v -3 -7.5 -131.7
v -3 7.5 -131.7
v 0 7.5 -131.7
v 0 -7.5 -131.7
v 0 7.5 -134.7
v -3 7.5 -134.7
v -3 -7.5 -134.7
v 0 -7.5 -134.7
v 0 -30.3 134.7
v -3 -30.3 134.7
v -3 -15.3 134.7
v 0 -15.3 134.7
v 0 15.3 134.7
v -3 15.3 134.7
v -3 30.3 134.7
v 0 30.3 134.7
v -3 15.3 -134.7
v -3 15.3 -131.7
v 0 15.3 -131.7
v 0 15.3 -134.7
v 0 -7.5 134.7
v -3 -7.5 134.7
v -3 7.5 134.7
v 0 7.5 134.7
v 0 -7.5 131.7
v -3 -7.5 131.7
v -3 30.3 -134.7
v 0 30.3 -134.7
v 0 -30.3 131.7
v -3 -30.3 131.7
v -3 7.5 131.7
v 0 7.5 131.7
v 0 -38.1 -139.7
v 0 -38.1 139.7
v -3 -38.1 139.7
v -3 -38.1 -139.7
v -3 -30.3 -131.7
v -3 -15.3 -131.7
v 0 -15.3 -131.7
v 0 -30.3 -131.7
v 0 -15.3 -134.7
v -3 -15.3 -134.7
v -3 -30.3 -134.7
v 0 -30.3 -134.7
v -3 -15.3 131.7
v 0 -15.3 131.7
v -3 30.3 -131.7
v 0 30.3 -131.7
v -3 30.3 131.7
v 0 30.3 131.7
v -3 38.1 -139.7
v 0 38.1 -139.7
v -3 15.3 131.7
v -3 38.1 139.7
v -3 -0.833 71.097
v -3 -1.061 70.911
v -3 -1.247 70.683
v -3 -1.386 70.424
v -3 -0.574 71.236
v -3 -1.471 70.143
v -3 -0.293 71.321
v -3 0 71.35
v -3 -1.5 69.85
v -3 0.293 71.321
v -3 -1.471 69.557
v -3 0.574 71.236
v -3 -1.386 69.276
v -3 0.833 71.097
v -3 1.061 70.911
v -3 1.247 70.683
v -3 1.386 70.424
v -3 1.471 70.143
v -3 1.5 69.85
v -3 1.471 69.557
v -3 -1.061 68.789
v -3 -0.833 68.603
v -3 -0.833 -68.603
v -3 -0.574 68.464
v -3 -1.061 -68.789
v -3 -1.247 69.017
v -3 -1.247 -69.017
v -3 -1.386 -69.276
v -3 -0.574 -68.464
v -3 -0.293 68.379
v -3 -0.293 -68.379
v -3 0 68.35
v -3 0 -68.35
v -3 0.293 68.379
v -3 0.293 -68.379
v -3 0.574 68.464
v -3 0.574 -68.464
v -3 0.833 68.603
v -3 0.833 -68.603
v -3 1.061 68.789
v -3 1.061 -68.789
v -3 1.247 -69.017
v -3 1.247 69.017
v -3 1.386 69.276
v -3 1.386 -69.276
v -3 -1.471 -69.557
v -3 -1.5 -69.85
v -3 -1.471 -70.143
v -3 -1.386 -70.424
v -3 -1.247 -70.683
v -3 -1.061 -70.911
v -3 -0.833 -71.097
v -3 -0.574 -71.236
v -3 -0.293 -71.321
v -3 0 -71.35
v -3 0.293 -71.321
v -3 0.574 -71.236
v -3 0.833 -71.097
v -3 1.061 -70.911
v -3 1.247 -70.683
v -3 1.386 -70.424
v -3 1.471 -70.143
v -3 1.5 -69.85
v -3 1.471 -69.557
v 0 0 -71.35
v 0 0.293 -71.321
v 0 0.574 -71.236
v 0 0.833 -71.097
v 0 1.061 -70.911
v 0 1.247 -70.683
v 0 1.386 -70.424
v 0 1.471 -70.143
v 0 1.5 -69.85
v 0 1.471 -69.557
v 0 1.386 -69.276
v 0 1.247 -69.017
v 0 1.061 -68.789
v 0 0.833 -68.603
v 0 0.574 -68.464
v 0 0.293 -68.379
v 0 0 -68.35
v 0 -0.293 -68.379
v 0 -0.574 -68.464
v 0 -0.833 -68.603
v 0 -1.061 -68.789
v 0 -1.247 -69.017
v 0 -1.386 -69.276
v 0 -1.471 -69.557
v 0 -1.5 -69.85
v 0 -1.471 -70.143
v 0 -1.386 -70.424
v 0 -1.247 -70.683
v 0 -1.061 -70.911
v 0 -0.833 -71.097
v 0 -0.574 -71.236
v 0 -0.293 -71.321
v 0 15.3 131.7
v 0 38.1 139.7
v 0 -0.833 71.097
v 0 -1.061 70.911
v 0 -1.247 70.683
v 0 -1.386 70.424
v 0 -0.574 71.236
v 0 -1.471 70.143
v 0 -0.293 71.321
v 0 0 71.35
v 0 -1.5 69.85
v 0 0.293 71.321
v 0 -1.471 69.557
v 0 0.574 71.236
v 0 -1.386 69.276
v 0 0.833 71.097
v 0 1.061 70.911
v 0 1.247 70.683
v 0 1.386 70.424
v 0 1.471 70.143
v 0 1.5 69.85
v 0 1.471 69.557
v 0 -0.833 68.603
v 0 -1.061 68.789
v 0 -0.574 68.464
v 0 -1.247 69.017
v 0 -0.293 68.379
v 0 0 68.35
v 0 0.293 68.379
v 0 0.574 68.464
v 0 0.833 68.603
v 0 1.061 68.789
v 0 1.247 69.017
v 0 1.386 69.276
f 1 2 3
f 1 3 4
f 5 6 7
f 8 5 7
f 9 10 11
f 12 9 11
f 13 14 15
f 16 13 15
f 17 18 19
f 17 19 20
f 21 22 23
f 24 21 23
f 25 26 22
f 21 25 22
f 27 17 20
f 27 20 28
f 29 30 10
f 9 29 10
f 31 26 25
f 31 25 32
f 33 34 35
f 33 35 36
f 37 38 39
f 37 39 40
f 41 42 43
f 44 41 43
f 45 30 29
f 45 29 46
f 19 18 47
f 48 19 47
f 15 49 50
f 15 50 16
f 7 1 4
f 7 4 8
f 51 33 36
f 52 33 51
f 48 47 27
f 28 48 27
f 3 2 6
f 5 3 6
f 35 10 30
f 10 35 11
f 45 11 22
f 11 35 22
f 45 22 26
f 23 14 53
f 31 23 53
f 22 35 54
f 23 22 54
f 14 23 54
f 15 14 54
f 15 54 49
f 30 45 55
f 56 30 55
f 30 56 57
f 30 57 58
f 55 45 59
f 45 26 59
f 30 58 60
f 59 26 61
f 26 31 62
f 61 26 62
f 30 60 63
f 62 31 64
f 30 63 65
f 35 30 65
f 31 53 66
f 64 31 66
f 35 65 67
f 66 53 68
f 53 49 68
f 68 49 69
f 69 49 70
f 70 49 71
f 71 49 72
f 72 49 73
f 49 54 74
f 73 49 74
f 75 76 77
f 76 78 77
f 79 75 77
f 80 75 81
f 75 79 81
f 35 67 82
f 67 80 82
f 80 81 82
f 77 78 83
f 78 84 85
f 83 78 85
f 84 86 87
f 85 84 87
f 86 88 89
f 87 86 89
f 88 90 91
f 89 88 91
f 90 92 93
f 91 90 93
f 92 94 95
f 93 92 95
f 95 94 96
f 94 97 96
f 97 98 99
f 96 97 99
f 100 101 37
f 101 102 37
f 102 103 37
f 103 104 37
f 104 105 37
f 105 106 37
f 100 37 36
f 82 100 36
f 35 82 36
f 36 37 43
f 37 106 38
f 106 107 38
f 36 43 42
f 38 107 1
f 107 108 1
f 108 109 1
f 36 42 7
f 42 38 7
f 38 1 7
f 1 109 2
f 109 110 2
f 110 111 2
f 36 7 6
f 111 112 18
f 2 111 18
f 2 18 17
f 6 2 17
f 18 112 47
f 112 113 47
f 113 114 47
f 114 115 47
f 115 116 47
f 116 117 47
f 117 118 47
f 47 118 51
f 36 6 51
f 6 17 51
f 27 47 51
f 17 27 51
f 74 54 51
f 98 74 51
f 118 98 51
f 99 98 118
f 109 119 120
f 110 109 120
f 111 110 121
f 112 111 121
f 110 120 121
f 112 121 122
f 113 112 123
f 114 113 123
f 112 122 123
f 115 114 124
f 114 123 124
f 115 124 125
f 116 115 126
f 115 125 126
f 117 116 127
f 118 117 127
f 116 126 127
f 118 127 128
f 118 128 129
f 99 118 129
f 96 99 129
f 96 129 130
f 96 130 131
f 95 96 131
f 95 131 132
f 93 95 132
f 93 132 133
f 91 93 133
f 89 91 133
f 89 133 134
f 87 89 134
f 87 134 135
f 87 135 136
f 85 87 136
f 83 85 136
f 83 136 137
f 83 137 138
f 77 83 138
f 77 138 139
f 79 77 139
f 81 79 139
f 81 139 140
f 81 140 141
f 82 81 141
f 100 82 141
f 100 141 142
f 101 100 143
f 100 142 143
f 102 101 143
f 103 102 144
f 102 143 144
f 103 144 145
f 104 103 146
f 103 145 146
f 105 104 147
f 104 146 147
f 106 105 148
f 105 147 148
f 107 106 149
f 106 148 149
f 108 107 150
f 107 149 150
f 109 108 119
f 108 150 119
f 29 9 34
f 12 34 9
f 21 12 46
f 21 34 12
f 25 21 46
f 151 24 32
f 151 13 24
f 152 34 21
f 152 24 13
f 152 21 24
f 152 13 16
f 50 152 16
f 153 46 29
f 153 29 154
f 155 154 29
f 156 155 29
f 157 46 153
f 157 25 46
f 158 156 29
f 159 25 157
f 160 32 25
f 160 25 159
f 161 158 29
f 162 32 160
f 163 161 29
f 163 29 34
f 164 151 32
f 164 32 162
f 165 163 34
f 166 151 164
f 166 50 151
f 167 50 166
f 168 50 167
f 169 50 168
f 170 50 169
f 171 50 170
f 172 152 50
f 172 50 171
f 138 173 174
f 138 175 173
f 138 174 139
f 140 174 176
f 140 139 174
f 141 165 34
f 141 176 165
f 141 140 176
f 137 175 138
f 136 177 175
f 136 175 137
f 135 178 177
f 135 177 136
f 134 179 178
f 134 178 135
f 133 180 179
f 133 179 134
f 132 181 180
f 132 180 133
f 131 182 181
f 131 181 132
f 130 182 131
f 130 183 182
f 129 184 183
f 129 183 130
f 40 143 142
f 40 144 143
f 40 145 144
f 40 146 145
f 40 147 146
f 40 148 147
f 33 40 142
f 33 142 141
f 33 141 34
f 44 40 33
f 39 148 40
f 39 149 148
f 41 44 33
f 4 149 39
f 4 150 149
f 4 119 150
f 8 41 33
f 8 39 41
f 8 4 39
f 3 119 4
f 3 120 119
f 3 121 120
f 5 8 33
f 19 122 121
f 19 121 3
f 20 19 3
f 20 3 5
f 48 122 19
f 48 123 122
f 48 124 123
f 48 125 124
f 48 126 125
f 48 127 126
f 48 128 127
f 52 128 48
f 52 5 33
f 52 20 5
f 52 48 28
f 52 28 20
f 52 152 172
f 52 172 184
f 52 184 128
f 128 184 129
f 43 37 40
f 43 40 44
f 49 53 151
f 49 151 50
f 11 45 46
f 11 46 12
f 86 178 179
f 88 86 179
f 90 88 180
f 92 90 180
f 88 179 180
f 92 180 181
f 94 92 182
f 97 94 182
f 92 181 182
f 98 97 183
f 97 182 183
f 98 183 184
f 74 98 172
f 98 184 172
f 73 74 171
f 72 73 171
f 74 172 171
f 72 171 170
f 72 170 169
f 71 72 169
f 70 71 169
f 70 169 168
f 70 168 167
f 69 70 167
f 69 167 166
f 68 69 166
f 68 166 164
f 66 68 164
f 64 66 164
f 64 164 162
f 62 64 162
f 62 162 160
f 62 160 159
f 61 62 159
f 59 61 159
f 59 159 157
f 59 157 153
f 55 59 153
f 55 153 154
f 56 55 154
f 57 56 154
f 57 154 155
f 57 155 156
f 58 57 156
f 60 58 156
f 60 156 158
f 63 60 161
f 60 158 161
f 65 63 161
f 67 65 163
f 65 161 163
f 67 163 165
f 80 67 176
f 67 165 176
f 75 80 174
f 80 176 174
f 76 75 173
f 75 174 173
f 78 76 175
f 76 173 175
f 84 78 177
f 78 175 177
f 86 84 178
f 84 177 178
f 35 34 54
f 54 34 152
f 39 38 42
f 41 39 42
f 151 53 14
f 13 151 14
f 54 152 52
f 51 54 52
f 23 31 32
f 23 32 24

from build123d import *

# Parameters (mm, degrees)
SKETCH1_W                       = 279.4
SKETCH1_H                       = 76.2
BOSS_EXTRUDE1_DEPTH             = 3
SKETCH3_W                       = 3
SKETCH3_H                       = 15
CUT_EXTRUDE1_DEPTH              = 145.833352512
LPATTERN1_COUNT                 = 3
LPATTERN1_PITCH                 = 22.8
MIRROR1_COPY_1_SKETCH_W         = 3
MIRROR1_COPY_1_SKETCH_H         = 15
MIRROR1_COPY_1_DEPTH            = 145.833352512
MIRROR1_COPY_2_SKETCH_W         = 3
MIRROR1_COPY_2_SKETCH_H         = 15
MIRROR1_COPY_2_DEPTH            = 145.833352512
F_3_0MM_CLEARANCE_DOWEL_HOLE1_D = 3


with BuildPart() as part:
    # Sketch1 → Boss-Extrude1 (new body)
    with BuildSketch(Plane(origin=(0, 0, 0), x_dir=(0, 0, -1), z_dir=(1, 0, 0))):
        Rectangle(SKETCH1_W, SKETCH1_H)
    extrude(amount=-BOSS_EXTRUDE1_DEPTH)

    # Sketch3 → Cut-Extrude1 (cut, through all)
    with BuildSketch(Plane.ZY.offset(3)):
        with Locations((133.2, 22.8)):
            Rectangle(SKETCH3_W, SKETCH3_H)
    cut_extrude1 = extrude(amount=-CUT_EXTRUDE1_DEPTH, mode=Mode.SUBTRACT)

    # LPattern1: Cut-Extrude1 ×3
    with Locations(*[(0, -i * LPATTERN1_PITCH, 0) for i in range(1, LPATTERN1_COUNT)]):
        add(cut_extrude1, mode=Mode.SUBTRACT)

    # Mirror1: Cut-Extrude1 across plane
    add(cut_extrude1.mirror(Plane.XY), mode=Mode.SUBTRACT)

    # Mirror1 copy 1 sketch → Mirror1 copy 1 (cut, through all)
    with BuildSketch(Plane(origin=(-3, -22.8, 0), x_dir=(0, 0, -1), z_dir=(-1, 0, 0))):
        with Locations((133.2, -22.8)):
            Rectangle(MIRROR1_COPY_1_SKETCH_W, MIRROR1_COPY_1_SKETCH_H)
    extrude(amount=-MIRROR1_COPY_1_DEPTH, mode=Mode.SUBTRACT)

    # Mirror1 copy 2 sketch → Mirror1 copy 2 (cut, through all)
    with BuildSketch(Plane(origin=(-3, -45.6, 0), x_dir=(0, 0, -1), z_dir=(-1, 0, 0))):
        with Locations((133.2, -22.8)):
            Rectangle(MIRROR1_COPY_2_SKETCH_W, MIRROR1_COPY_2_SKETCH_H)
    extrude(amount=-MIRROR1_COPY_2_DEPTH, mode=Mode.SUBTRACT)

    # Ø3.0mm Clearance Dowel Hole1 (through all)
    with Locations(Plane.ZY.offset(3)):
        with Locations((-69.85, 0), (69.85, 0)):
            Hole(F_3_0MM_CLEARANCE_DOWEL_HOLE1_D / 2)


solid = part.part
